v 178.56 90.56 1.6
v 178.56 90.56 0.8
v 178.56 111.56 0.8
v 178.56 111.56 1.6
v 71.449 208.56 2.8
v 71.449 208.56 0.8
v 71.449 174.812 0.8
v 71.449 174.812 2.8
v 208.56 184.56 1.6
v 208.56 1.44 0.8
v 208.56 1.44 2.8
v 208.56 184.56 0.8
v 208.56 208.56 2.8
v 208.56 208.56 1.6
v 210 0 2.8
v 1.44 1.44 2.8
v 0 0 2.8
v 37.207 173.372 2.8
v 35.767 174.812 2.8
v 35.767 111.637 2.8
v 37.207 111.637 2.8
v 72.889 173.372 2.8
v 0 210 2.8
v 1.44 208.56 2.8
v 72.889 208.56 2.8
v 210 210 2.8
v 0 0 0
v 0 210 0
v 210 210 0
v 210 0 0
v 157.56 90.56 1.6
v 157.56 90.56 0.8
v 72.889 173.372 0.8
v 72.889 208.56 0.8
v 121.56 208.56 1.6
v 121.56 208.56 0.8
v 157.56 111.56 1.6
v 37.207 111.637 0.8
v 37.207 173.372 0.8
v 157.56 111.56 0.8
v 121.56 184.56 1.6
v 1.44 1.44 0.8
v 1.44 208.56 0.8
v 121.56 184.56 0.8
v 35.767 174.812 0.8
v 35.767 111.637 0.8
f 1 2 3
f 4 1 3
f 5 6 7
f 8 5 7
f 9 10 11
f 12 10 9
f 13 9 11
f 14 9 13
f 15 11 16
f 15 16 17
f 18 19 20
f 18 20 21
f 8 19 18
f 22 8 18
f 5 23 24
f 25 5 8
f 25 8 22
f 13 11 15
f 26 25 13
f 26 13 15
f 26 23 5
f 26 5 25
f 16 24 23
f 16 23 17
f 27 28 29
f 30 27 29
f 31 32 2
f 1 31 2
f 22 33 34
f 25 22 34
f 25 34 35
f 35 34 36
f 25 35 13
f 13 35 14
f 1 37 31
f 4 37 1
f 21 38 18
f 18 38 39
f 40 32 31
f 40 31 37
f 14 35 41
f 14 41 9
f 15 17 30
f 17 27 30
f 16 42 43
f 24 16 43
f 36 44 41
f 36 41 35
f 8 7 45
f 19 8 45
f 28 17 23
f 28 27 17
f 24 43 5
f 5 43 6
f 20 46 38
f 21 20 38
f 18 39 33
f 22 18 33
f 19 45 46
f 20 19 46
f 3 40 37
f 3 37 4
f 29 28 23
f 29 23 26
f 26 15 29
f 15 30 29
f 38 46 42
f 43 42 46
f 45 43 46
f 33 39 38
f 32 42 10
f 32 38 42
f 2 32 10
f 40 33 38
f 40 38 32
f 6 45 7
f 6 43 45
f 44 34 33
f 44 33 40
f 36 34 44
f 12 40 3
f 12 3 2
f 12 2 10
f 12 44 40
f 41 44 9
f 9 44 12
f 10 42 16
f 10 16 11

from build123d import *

# Parameters (mm, degrees)
F0_W     = 210
F0_H     = 210
F1_DEPTH = 0.8
F2_W     = 210
F2_H     = 210
F2_W_2   = 207.12
F2_H_2   = 207.12
F3_DEPTH = 2
F5_DEPTH = 2
F6_W     = 87
F6_H     = 24
F6_W_2   = 21
F6_H_2   = 21
F7_DEPTH = 0.8


with BuildPart() as f1:
    # F0 (on Top) → F1 (new body)
    with BuildSketch(Plane.XY):
        with Locations((105, 105)):
            Rectangle(F0_W, F0_H)
    extrude(amount=F1_DEPTH)

    # F2 (on face) → F3 (join)
    with BuildSketch(Plane.XY.offset(0.8)):
        with Locations((105, 105)):
            Rectangle(F2_W, F2_H)
        with Locations((105, 105)):
            Rectangle(F2_W_2, F2_H_2, mode=Mode.SUBTRACT)
    extrude(amount=F3_DEPTH)

    # F4 (on face) → F5 (join, through all)
    with BuildSketch(Plane.XY.offset(0.8)):
        Polygon((72.889231, 173.372308), (72.889231, 208.56), (71.449231, 208.56), (71.449231, 174.812308), (35.766923, 174.812308), (35.766923, 111.636923), (37.206923, 111.636923), (37.206923, 173.372308), align=None)
    extrude(amount=F5_DEPTH)

    # F6 (on face) → F7 (join)
    with BuildSketch(Plane.XY.offset(0.8)):
        with Locations((165.06, 196.56)):
            Rectangle(F6_W, F6_H)
        with Locations((168.06, 101.06)):
            Rectangle(F6_W_2, F6_H_2)
    extrude(amount=F7_DEPTH)


solid = f1.part
